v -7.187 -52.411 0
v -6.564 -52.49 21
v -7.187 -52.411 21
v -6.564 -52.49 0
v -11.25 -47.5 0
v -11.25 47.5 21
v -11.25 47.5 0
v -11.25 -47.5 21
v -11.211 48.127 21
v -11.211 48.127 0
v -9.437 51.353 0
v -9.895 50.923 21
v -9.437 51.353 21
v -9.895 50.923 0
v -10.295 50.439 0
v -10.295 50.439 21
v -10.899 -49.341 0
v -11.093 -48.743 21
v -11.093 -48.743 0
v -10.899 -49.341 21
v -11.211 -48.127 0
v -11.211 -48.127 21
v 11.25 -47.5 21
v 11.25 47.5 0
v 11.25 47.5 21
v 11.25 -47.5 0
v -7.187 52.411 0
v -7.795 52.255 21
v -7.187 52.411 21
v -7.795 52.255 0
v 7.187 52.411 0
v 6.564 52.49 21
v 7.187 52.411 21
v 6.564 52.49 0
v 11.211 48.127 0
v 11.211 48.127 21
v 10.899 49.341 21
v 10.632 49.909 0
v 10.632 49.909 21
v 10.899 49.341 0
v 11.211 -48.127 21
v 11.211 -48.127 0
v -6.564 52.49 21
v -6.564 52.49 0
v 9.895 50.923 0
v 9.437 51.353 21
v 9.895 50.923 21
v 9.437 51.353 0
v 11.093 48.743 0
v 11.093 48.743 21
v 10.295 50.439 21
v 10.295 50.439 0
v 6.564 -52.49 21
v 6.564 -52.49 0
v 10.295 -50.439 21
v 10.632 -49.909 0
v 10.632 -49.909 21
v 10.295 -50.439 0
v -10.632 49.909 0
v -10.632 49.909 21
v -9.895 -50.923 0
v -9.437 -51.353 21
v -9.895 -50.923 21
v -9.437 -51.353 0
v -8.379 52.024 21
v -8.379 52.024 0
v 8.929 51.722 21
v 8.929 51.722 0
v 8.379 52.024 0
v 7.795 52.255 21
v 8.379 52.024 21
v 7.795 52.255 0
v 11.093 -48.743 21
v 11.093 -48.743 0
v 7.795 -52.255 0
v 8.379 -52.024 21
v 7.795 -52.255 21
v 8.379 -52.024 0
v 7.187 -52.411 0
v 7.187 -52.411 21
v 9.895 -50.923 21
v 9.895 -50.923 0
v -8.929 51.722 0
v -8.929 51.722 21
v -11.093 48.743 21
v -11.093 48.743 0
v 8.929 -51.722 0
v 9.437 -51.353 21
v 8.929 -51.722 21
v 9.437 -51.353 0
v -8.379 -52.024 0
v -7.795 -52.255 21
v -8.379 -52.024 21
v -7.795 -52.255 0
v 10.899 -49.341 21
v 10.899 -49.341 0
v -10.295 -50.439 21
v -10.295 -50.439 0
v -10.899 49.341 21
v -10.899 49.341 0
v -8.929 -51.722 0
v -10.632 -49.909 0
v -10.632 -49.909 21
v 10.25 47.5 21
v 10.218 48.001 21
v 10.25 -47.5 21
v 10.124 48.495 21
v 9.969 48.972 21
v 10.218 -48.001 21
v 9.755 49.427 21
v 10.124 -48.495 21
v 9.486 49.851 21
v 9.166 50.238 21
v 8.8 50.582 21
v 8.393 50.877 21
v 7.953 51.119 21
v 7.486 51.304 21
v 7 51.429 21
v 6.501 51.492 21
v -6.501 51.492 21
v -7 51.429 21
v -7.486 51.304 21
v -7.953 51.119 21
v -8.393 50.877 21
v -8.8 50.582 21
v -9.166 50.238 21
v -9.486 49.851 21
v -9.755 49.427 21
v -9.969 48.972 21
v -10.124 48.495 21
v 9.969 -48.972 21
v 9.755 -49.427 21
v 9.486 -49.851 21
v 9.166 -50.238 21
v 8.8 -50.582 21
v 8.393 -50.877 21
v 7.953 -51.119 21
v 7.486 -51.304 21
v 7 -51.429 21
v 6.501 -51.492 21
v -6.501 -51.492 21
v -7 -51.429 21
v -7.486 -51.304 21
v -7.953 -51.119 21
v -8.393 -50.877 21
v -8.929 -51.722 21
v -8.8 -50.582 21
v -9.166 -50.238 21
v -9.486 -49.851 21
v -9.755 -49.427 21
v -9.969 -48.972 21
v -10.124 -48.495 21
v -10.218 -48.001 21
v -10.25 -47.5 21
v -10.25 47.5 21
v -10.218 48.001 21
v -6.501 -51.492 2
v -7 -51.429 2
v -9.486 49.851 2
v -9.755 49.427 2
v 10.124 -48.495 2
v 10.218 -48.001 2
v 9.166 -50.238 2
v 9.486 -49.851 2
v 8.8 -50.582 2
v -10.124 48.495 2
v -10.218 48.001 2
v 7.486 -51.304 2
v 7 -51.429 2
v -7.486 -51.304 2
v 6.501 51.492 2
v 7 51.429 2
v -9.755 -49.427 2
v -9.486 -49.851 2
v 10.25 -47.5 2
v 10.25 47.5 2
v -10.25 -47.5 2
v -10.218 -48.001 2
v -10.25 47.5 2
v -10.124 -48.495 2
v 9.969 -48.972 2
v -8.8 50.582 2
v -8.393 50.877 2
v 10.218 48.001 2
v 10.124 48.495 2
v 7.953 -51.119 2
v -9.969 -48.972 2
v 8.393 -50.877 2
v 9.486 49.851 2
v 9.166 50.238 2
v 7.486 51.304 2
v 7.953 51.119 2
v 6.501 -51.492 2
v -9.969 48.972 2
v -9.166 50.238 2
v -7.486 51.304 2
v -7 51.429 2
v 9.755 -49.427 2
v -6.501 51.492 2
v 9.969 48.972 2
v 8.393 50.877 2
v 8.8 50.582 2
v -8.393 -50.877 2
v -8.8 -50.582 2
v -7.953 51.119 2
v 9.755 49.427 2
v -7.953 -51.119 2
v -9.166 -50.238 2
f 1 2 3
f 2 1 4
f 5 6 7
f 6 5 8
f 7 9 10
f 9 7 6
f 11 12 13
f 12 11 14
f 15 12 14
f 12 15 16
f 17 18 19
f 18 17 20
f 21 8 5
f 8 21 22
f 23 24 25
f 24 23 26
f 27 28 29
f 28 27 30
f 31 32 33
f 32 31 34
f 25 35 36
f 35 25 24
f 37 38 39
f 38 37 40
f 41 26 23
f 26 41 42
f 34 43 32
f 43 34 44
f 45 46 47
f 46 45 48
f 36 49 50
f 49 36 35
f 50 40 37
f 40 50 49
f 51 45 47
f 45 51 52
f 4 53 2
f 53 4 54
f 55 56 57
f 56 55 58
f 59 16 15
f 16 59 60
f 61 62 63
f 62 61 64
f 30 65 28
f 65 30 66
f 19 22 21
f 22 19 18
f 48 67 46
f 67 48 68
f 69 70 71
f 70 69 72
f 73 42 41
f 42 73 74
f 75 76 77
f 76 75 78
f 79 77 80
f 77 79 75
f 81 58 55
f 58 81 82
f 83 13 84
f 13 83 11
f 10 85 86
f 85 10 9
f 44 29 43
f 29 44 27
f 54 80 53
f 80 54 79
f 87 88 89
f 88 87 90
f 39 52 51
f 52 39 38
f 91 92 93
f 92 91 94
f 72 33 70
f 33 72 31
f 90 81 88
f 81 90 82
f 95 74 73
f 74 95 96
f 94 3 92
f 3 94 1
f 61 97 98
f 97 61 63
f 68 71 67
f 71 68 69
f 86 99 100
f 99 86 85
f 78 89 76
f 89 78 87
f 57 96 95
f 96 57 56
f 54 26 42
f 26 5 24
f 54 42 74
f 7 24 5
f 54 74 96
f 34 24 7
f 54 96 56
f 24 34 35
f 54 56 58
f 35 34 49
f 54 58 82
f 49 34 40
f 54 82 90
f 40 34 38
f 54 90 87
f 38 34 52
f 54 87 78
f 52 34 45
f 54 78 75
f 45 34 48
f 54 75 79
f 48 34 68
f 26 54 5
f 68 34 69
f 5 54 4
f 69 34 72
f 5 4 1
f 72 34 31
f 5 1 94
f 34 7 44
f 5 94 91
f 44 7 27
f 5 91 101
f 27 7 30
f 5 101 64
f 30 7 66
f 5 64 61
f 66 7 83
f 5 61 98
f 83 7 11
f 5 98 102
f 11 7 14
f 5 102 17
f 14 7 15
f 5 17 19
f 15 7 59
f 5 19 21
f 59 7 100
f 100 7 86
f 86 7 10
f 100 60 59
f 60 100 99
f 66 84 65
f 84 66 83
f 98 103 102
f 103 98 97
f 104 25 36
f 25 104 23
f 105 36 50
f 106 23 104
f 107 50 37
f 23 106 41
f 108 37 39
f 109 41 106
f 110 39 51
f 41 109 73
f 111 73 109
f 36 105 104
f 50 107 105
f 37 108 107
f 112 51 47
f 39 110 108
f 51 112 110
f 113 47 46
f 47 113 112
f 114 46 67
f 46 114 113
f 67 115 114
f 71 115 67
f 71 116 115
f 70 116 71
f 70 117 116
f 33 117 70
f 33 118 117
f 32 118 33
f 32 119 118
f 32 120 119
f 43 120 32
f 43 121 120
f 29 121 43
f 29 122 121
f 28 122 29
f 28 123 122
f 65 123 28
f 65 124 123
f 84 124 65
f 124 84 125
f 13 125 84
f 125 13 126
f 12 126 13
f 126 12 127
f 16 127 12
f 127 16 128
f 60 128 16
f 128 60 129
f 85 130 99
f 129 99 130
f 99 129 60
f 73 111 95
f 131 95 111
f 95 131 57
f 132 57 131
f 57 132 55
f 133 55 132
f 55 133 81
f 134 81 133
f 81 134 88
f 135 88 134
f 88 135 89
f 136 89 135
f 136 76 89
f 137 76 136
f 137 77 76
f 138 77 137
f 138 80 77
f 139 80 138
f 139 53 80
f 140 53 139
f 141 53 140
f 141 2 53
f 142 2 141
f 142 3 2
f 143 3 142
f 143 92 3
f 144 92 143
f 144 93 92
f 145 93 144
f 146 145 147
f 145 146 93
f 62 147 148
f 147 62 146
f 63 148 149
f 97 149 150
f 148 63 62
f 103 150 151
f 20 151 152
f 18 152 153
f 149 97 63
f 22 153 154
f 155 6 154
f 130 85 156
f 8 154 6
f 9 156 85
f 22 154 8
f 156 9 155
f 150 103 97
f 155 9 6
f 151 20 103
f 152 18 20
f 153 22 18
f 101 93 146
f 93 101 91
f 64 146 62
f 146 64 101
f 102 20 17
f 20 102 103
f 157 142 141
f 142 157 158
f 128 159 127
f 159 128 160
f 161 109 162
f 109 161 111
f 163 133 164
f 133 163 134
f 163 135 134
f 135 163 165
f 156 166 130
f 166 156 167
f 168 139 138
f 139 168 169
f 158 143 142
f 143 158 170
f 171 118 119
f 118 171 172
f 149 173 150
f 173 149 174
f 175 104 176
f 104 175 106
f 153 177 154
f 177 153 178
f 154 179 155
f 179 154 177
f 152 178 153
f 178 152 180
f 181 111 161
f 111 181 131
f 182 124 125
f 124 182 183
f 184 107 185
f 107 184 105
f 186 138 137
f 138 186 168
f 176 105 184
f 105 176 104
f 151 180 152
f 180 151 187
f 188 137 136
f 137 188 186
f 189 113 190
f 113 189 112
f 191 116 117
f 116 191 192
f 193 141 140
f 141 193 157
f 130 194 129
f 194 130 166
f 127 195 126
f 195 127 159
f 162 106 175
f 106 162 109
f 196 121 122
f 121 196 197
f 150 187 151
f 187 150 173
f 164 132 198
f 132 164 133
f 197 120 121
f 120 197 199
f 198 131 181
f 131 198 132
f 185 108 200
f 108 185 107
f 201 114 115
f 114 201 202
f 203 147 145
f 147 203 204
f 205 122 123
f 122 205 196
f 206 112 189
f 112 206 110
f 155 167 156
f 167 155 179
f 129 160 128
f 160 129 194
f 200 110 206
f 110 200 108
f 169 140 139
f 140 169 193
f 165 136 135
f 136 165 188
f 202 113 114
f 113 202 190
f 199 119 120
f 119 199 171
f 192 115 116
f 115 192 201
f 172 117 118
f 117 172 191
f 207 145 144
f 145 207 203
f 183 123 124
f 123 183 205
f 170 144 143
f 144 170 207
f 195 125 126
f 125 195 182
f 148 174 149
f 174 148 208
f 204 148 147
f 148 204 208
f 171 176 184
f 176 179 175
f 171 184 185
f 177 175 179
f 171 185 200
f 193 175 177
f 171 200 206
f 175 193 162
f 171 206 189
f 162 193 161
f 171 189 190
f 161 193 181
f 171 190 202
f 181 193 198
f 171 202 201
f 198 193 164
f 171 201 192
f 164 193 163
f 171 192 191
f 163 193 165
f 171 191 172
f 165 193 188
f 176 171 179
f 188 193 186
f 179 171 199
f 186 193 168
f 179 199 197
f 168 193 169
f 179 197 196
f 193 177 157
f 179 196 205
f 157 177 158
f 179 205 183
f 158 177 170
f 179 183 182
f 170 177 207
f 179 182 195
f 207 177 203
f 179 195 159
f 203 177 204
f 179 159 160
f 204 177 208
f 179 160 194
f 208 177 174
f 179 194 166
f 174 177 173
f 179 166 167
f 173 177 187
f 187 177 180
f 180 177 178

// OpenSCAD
$fn = 50;


difference() {
	union() {
		hull() {
			translate(v = [-6.2500000000, 47.5000000000, 0]) {
				cylinder(h = 21, r = 5);
			}
			translate(v = [6.2500000000, 47.5000000000, 0]) {
				cylinder(h = 21, r = 5);
			}
			translate(v = [-6.2500000000, -47.5000000000, 0]) {
				cylinder(h = 21, r = 5);
			}
			translate(v = [6.2500000000, -47.5000000000, 0]) {
				cylinder(h = 21, r = 5);
			}
		}
	}
	union() {
		translate(v = [0, 0, 2]) {
			hull() {
				translate(v = [-6.2500000000, 47.5000000000, 0]) {
					cylinder(h = 19, r = 4);
				}
				translate(v = [6.2500000000, 47.5000000000, 0]) {
					cylinder(h = 19, r = 4);
				}
				translate(v = [-6.2500000000, -47.5000000000, 0]) {
					cylinder(h = 19, r = 4);
				}
				translate(v = [6.2500000000, -47.5000000000, 0]) {
					cylinder(h = 19, r = 4);
				}
			}
		}
	}
}
